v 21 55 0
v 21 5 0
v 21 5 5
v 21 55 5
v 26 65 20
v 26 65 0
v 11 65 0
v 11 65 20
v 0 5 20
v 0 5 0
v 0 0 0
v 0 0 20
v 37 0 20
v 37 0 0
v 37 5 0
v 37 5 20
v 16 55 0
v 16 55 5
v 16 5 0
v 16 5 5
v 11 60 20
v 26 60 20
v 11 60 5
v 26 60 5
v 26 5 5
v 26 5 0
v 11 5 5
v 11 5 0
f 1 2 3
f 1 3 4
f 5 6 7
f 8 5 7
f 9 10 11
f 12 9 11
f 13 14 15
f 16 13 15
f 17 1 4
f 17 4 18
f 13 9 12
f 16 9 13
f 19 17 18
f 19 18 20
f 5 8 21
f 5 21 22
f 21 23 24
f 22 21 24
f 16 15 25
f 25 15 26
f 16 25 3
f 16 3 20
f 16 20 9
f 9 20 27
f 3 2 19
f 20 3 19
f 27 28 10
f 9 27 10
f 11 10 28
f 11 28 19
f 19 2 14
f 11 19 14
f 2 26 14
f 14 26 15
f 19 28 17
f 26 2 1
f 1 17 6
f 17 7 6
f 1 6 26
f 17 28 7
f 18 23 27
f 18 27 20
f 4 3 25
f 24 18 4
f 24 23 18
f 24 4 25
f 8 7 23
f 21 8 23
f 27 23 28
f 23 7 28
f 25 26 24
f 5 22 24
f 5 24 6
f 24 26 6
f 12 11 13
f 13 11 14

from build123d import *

# Parameters (mm, degrees)
PAD_DEPTH     = 5
SKETCH001_W   = 37
SKETCH001_H   = 5
SKETCH001_W_2 = 15
PAD001_DEPTH  = 20


with BuildPart() as part:
    # Sketch → Pad (new body)
    with BuildSketch(Plane.XY):
        Polygon((0, 5), (0, 0), (37, 0), (37, 5), (26, 5), (26, 65), (11, 65), (11, 5), align=None)
        Polygon((16, 5), (21, 5), (21, 55), (16.000076, 55), align=None, mode=Mode.SUBTRACT)
    extrude(amount=PAD_DEPTH)

    # Sketch001 → Pad001 (join)
    with BuildSketch(Plane.XY):
        with Locations((18.5, 2.5)):
            Rectangle(SKETCH001_W, SKETCH001_H)
        with Locations((18.5, 62.5)):
            Rectangle(SKETCH001_W_2, SKETCH001_H)
    extrude(amount=PAD001_DEPTH)


solid = part.part
